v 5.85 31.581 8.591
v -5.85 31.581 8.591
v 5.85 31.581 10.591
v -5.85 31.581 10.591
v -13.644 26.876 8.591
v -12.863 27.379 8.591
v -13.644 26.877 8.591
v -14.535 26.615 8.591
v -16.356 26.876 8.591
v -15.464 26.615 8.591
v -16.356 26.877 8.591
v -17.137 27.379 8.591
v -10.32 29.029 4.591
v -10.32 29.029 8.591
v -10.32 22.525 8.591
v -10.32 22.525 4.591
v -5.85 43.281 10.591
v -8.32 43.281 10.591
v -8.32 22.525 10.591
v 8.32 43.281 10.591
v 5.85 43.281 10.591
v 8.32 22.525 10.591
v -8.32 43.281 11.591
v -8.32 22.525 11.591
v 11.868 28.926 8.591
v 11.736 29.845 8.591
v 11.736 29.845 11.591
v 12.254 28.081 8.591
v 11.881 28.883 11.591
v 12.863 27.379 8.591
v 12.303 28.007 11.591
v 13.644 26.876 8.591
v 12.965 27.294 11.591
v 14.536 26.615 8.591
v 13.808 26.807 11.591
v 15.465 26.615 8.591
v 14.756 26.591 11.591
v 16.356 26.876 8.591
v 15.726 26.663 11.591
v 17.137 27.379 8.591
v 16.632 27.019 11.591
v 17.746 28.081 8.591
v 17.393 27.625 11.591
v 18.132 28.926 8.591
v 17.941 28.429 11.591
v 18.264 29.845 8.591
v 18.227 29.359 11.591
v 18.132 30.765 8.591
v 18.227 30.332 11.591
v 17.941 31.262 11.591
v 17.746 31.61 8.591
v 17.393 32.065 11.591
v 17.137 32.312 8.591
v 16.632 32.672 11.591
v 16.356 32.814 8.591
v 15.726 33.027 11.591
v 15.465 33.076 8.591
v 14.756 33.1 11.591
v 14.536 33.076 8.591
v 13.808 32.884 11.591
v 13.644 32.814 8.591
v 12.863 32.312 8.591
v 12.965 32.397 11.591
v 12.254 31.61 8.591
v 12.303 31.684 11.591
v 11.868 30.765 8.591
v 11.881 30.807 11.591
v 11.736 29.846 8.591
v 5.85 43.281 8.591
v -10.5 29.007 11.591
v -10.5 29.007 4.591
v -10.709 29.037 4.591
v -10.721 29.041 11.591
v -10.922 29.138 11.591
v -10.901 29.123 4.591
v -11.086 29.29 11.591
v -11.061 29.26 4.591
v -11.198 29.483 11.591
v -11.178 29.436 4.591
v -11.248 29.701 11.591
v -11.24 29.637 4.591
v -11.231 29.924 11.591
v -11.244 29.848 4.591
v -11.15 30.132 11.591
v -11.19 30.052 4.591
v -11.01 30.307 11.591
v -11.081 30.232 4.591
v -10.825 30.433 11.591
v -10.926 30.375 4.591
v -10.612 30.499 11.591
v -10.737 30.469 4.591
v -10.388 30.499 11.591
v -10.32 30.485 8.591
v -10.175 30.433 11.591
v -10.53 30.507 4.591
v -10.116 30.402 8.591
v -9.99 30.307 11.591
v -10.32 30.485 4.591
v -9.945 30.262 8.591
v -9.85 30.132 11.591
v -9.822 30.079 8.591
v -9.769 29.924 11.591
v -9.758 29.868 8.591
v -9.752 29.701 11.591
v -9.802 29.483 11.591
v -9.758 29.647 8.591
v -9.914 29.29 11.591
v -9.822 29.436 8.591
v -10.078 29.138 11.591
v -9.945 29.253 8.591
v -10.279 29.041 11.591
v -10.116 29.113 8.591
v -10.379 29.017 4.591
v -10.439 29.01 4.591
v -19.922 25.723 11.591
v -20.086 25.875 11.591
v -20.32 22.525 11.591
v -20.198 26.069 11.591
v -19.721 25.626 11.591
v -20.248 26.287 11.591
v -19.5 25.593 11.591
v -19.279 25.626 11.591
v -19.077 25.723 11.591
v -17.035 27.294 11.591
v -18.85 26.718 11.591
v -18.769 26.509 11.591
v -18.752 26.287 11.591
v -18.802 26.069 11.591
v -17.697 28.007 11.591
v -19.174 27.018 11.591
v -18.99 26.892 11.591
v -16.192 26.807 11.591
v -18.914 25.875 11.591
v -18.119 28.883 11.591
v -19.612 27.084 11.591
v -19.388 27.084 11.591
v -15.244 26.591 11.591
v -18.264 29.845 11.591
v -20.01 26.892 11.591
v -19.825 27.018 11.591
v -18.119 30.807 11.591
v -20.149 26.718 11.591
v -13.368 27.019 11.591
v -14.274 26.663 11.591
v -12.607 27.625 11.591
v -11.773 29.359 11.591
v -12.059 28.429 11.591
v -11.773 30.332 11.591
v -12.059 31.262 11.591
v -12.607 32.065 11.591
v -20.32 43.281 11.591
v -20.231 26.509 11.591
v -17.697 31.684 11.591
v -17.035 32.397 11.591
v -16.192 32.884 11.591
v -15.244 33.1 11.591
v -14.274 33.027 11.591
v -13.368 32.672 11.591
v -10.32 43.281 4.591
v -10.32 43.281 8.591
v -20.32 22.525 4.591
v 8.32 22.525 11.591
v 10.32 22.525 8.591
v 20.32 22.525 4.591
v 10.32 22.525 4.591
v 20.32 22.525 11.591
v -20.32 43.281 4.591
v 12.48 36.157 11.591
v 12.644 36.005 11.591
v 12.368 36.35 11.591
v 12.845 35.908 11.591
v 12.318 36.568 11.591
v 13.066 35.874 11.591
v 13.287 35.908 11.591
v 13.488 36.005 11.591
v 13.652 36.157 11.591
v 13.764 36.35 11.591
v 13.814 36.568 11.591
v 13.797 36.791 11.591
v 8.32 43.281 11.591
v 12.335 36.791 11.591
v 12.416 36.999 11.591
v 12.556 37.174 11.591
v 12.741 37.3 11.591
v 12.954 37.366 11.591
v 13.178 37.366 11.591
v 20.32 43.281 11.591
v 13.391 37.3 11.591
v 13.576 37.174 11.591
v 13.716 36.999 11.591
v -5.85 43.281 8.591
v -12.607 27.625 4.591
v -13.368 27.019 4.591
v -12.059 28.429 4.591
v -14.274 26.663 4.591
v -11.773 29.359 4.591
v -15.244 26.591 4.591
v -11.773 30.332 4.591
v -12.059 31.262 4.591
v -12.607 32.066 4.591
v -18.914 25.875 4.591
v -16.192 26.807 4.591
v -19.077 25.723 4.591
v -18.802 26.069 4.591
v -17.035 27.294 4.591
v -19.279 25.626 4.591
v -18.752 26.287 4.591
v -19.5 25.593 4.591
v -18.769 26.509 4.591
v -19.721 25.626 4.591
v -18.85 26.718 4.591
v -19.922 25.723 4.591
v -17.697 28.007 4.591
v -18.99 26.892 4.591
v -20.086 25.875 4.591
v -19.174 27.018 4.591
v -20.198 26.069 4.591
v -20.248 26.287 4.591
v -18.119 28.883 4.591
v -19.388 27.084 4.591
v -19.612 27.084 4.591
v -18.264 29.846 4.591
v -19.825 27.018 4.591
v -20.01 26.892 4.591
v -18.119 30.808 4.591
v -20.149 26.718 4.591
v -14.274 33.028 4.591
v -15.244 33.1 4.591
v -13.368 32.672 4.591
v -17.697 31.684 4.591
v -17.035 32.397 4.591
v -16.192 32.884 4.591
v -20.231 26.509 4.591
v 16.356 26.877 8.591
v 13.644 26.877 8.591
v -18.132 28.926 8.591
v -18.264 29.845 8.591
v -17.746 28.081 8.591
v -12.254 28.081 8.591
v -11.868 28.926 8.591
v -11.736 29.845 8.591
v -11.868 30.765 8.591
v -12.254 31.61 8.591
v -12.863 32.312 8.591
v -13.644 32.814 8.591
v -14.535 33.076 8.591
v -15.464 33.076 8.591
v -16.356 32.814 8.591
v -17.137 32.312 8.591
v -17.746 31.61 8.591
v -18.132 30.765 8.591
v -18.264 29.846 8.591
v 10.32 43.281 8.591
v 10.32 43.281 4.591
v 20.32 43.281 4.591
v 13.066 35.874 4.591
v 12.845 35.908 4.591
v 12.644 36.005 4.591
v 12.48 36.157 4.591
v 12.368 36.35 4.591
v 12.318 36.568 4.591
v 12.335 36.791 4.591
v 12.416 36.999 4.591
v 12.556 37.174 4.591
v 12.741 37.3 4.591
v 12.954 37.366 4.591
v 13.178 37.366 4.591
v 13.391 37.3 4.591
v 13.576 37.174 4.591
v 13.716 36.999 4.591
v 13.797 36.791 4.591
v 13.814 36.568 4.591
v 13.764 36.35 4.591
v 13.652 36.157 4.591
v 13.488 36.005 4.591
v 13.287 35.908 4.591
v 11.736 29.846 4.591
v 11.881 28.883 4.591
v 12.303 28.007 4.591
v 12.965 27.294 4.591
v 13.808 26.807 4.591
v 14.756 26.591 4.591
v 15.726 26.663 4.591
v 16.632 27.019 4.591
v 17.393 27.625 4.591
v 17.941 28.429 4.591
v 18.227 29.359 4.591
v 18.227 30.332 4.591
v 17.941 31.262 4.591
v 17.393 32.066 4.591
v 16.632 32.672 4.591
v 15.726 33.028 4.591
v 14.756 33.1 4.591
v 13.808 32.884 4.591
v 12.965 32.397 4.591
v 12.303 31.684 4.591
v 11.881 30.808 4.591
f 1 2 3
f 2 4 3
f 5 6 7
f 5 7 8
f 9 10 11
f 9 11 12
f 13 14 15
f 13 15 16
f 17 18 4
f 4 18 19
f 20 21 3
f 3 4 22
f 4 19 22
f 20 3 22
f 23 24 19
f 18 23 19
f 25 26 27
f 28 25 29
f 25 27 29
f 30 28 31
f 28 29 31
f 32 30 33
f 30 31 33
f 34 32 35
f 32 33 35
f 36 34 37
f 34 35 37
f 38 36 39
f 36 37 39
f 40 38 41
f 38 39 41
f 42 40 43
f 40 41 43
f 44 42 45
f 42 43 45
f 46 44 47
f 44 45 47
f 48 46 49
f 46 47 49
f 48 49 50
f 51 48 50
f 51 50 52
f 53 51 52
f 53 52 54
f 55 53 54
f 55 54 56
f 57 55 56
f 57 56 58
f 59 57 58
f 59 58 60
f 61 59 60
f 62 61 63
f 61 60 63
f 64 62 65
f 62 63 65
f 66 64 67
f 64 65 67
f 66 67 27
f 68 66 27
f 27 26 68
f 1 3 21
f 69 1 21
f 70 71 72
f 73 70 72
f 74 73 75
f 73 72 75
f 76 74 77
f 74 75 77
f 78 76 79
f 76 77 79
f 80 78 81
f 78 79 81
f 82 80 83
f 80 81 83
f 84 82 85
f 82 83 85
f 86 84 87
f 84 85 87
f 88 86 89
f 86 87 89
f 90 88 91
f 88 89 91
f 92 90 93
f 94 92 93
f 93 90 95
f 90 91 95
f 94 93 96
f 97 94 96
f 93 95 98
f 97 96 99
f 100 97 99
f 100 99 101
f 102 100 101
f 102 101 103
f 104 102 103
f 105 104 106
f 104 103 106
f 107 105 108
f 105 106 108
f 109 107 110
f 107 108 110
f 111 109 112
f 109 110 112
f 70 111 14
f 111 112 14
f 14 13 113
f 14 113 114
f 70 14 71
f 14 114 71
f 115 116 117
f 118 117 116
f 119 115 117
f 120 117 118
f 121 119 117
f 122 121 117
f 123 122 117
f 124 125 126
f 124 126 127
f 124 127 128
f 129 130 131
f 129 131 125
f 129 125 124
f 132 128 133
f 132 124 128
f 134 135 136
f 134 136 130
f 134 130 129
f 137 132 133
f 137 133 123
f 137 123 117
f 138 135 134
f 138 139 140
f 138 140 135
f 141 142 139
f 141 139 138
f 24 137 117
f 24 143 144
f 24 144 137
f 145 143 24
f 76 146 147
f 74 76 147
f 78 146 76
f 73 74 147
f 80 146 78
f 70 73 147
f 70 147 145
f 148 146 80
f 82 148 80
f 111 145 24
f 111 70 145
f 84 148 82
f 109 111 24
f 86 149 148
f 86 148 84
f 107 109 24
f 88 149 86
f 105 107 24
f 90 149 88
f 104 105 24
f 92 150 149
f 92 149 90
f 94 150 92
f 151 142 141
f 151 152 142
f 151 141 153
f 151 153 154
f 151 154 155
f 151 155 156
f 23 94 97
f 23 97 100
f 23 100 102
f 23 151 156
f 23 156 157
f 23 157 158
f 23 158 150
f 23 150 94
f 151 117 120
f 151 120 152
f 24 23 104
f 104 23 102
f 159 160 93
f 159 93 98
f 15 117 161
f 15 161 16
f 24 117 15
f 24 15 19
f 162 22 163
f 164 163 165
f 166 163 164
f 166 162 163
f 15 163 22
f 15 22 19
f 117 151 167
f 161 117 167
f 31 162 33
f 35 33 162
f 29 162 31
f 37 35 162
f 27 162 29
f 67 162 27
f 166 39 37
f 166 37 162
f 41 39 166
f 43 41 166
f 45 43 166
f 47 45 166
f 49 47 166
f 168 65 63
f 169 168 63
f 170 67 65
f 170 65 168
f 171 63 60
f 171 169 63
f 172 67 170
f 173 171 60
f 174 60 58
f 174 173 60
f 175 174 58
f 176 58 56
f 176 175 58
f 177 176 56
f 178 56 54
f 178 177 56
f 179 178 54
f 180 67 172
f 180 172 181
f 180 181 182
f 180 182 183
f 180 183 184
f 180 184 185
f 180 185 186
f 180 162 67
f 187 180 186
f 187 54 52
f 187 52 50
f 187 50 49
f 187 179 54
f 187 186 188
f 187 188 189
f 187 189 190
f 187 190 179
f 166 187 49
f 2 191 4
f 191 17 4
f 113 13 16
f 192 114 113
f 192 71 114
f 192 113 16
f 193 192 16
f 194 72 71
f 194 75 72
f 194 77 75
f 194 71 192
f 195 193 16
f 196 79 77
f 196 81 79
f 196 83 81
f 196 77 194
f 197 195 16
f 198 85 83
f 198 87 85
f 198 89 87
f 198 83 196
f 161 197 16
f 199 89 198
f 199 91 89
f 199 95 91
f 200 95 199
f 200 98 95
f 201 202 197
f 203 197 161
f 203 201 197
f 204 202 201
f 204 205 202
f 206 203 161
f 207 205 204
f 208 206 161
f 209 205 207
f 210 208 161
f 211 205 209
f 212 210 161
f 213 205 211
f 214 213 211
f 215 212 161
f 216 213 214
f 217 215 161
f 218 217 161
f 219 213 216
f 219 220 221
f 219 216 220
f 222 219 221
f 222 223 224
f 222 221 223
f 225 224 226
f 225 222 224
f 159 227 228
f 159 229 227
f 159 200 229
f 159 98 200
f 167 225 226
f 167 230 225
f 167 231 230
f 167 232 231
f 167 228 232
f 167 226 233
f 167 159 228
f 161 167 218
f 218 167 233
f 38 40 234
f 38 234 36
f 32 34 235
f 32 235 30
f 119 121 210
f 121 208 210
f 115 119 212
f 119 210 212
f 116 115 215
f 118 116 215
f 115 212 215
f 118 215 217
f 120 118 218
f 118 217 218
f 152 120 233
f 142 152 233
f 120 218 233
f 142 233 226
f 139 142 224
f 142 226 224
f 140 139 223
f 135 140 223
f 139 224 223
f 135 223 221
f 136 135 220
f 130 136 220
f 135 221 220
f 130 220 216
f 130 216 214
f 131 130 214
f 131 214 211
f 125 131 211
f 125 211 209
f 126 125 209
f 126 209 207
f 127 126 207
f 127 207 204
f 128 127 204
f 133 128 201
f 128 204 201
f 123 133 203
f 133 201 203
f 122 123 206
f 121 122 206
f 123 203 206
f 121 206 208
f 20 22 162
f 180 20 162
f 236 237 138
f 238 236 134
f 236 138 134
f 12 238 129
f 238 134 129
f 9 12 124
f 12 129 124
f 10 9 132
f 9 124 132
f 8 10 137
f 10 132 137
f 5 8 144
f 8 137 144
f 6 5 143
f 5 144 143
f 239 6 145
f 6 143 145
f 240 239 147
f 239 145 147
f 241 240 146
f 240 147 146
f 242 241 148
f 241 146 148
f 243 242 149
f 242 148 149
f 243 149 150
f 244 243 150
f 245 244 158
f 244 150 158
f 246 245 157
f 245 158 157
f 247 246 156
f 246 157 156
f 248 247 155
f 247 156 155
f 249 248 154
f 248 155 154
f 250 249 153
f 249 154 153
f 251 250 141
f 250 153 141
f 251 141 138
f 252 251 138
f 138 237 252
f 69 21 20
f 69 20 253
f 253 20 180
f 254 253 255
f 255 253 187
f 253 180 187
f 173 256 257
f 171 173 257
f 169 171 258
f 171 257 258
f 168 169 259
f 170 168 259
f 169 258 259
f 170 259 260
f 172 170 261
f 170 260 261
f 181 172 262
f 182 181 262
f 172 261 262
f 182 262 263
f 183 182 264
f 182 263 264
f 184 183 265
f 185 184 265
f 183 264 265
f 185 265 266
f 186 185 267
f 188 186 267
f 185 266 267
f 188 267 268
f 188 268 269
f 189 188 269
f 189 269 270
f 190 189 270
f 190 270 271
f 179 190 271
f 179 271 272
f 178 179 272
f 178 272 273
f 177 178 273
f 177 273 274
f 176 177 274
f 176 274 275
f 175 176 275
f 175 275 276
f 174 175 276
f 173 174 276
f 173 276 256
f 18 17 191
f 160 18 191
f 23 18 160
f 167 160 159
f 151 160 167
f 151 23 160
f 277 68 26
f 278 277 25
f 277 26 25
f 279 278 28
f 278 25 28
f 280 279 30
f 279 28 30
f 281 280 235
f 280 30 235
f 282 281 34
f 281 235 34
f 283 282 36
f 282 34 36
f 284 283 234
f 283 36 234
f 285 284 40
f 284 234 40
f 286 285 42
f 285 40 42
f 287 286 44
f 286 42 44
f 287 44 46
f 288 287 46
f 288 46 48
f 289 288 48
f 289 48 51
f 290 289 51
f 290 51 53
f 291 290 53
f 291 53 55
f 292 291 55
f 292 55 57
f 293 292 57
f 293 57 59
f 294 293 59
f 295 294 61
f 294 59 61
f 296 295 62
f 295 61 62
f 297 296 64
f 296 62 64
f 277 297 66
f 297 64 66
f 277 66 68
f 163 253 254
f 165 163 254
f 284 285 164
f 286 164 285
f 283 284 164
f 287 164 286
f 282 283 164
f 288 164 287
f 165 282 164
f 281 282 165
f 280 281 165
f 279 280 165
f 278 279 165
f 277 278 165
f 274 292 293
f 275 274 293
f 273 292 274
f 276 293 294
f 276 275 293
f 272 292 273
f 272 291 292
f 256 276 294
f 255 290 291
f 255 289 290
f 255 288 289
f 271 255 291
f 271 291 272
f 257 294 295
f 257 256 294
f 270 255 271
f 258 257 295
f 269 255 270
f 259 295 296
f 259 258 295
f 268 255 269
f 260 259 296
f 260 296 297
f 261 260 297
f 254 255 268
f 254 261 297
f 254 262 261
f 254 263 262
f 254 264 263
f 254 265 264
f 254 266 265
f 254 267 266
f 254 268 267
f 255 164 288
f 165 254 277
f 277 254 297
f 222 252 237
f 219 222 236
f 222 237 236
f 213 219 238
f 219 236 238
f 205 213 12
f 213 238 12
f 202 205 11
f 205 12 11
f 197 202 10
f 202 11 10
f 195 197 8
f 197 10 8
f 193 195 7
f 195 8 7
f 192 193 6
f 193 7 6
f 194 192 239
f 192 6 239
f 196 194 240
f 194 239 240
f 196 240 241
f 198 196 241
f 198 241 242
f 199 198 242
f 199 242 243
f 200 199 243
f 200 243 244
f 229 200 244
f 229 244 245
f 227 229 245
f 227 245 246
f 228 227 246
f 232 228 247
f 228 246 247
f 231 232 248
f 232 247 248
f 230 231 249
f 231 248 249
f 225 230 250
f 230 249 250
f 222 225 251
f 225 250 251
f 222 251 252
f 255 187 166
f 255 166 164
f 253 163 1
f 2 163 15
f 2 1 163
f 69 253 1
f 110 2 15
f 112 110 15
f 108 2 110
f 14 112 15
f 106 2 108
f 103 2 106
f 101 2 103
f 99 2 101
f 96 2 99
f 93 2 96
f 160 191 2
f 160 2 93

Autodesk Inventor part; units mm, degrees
ref_plane "YZ Plane" through (0, 0, 0) normal (1, 0, 0) x (0, 1, 0)
ref_plane "XZ Plane" through (0, 0, 0) normal (0, 1, 0) x (-1, 0, 0)
ref_plane "Work Plane1" through (0, 37.4307, 11.591) normal (0, 0, 1) x (1, 0, 0)
sketch "Sketch1" plane through (0, 37.4307, 11.591) normal (0, 0, 1) x (1, 0, 0)
  circle A0 centre (0, 0) radius 1.2261 construction
  line L0 (4.85, 4.85) -> (-4.85, 4.85) construction
  line L1 (-4.85, 4.85) -> (-4.85, -4.85) construction
  line L2 (-4.85, -4.85) -> (4.85, -4.85) construction
  line L3 (4.85, -4.85) -> (4.85, 4.85) construction
  line L4 (5.85, 5.85) -> (-5.85, 5.85)
  line L5 (-5.85, 5.85) -> (-5.85, -5.85)
  line L6 (-5.85, -5.85) -> (5.85, -5.85)
  line L7 (5.85, -5.85) -> (5.85, 5.85)
  line L8 (20.32, 25.4487) -> (20.32, -10.6193) projected
  line L9 (-20.32, -10.6193) -> (-20.32, 25.4487) projected
  line L10 (5.85, 5.85) -> (20.32, 5.85)
  line L11 (20.32, 5.85) -> (20.32, -5.85)
  line L12 (20.32, -5.85) -> (5.85, -5.85)
  line L13 (5.85, -5.85) -> (5.85, 5.85)
  line L14 (-5.85, 5.85) -> (-20.32, 5.85)
  line L15 (-20.32, 5.85) -> (-20.32, -5.85)
  line L16 (-20.32, -5.85) -> (-5.85, -5.85)
  line L17 (-5.85, -5.85) -> (-5.85, 5.85)
  line L18 (18.034, -12.9053) -> (-18.034, -12.9053) projected
  line L19 (20.32, -5.85) -> (-20.32, -5.85)
  line L20 (-20.32, -5.85) -> (-20.32, -12.9053)
  line L21 (-20.32, -12.9053) -> (20.32, -12.9053)
  line L22 (20.32, -12.9053) -> (20.32, -5.85)
  point P0 (0, -37.4307)
  dimension "d0" = 1
ref_plane "Work Plane2" through (-20.066, 24.7794, 0) normal (0, 0, 1) x (1, 0, 0)
extrude "Extrusion1" add sketch "Sketch1" against normal blind 3 contours L10 L8 L12 L7 | L5 L16 L9 L14 | L12 L8 L22 L21 L18 L20 L9 L16 L6
sketch "Sketch2" plane through (20.32, 24.5254, 11.591) normal (0, 0, -1) x (-1, 0, 0)
  circle A0 centre (35.32, 5.32) radius 3.0099 projected
  circle A1 centre (5.32, 5.32) radius 3.0099 projected
  circle A2 centre (35.32, 5.32) radius 3.2639 projected
  circle A3 centre (5.32, 5.32) radius 3.2639 projected
extrude "Extrusion2" cut sketch "Sketch2" along normal through all contours A0 | A1 | A2 | A3
sketch "Sketch9" plane through (0, 37.4307, 8.591) normal (0, 0, -1) x (-1, 0, 0)
  line L0 (5.85, -5.85) -> (-5.85, -5.85) projected
  circle A0 centre (-15, -7.5852) radius 3.2639 projected
  line L1 (-20.32, 5.85) -> (-20.32, -12.9053) projected
  line L2 (-20.32, -12.9053) -> (20.32, -12.9053) projected
  line L3 (20.32, -12.9053) -> (20.32, 5.85) projected
  circle A1 centre (15, -7.5852) radius 3.2639 projected
  line L4 (-5.85, 5.85) -> (-20.32, 5.85) projected
  line L5 (20.32, 5.85) -> (5.85, 5.85) projected
  line L6 (5.85, 5.85) -> (5.85, -5.85) projected
  line L7 (-5.85, -5.85) -> (-5.85, 5.85) projected
  line L8 (20.32, 5.85) -> (20.32, -12.9053) projected
  line L9 (20.32, 5.85) -> (5.85, 5.85) projected
  line L10 (20.32, -12.9053) -> (10.32, -12.9053)
  line L11 (10.32, -12.9053) -> (10.32, 5.85)
  line L12 (10.32, 5.85) -> (20.32, 5.85)
  line L13 (20.32, 5.85) -> (20.32, -12.9053)
  line L14 (-20.32, -12.9053) -> (-10.32, -12.9053)
  line L15 (-10.32, -12.9053) -> (-10.32, 5.85)
  line L16 (-10.32, 5.85) -> (-20.32, 5.85)
  line L17 (-20.32, 5.85) -> (-20.32, -12.9053)
  point P0 (0, -37.4307)
  dimension "d36" = 10
  dimension "d37" = 10
extrude "Extrusion9" add sketch "Sketch9" along normal blind 4 contours L5 L3 L2 L11 | L15 L2 L1 L4
sketch "Sketch10" plane through (-20.32, 24.5254, 11.591) normal (0, -1, 0) x (1, 0, 0)
  line L0 (0, 0) -> (40.64, 0) projected
  line L1 (0, 0) -> (0, -7) projected
  line L2 (10, -7) -> (0, -7) projected
  line L3 (10, -3) -> (10, -7) projected
  line L4 (30.64, -3) -> (10, -3) projected
  line L5 (30.64, -3) -> (30.64, -7) projected
  line L6 (40.64, -7) -> (30.64, -7) projected
  line L7 (40.64, 0) -> (40.64, -7) projected
  point P0 (20.32, -11.591)
extrude "Extrusion10" add sketch "Sketch10" along normal blind 2
sketch "Sketch11" plane through (0, 37.4307, 11.591) normal (0, 0, 1) x (1, 0, 0)
  circle A0 centre (-40.9999, 4.4119) radius 1 projected
  circle A1 centre (-19.4999, -11.0881) radius 1 projected
  circle A2 centre (-12.9999, 9.4119) radius 1 projected
  circle A3 centre (-10.5, -7.6734) radius 1 projected
  circle A4 centre (-17, 12.8266) radius 1 projected
  circle A5 centre (11, 7.8266) radius 1 projected
  point P0 (6.3071, -26.4348)
  point P1 (13.066, -0.8064)
hole "Hole1" at (13.066, 36.6243, 11.591) at (6.3071, 10.9959, 11.591) at (-40.9999, 41.8426, 11.591) at (-19.4999, 26.3426, 11.591) at (-10.5, 29.7573, 11.591) direction (0, 0, -1) diameter 1.5 end through all
sketch "Sketch12" plane through (-20.32, 22.5254, 11.591) normal (0, -1, 0) x (1, 0, 0)
  line L0 (40.64, 0) -> (0, 0) projected
  line L1 (0, 0) -> (0, -7) projected
  line L2 (0, -7) -> (10, -7) projected
  line L3 (10, -7) -> (10, -3) projected
  line L4 (10, -3) -> (30.64, -3) projected
  line L5 (30.64, -3) -> (30.64, -7) projected
  line L6 (30.64, -7) -> (40.64, -7) projected
  line L7 (40.64, -7) -> (40.64, 0) projected
  line L8 (40.64, 0) -> (26.17, 0) projected
  line L9 (28.64, 0) -> (12, 0)
  line L10 (12, 0) -> (12, -1)
  line L11 (12, -1) -> (28.64, -1)
  line L12 (28.64, -1) -> (28.64, 0)
  point P0 (20.32, -11.591)
  dimension "d49" = 1
  dimension "d52" = 2
  dimension "d53" = 2
extrude "Extrusion11" cut sketch "Sketch12" against normal through all contours L12 L11 L10 L0
properties part number "20_Adapter_Bluray_KES400_Lens_Thorlabs"
